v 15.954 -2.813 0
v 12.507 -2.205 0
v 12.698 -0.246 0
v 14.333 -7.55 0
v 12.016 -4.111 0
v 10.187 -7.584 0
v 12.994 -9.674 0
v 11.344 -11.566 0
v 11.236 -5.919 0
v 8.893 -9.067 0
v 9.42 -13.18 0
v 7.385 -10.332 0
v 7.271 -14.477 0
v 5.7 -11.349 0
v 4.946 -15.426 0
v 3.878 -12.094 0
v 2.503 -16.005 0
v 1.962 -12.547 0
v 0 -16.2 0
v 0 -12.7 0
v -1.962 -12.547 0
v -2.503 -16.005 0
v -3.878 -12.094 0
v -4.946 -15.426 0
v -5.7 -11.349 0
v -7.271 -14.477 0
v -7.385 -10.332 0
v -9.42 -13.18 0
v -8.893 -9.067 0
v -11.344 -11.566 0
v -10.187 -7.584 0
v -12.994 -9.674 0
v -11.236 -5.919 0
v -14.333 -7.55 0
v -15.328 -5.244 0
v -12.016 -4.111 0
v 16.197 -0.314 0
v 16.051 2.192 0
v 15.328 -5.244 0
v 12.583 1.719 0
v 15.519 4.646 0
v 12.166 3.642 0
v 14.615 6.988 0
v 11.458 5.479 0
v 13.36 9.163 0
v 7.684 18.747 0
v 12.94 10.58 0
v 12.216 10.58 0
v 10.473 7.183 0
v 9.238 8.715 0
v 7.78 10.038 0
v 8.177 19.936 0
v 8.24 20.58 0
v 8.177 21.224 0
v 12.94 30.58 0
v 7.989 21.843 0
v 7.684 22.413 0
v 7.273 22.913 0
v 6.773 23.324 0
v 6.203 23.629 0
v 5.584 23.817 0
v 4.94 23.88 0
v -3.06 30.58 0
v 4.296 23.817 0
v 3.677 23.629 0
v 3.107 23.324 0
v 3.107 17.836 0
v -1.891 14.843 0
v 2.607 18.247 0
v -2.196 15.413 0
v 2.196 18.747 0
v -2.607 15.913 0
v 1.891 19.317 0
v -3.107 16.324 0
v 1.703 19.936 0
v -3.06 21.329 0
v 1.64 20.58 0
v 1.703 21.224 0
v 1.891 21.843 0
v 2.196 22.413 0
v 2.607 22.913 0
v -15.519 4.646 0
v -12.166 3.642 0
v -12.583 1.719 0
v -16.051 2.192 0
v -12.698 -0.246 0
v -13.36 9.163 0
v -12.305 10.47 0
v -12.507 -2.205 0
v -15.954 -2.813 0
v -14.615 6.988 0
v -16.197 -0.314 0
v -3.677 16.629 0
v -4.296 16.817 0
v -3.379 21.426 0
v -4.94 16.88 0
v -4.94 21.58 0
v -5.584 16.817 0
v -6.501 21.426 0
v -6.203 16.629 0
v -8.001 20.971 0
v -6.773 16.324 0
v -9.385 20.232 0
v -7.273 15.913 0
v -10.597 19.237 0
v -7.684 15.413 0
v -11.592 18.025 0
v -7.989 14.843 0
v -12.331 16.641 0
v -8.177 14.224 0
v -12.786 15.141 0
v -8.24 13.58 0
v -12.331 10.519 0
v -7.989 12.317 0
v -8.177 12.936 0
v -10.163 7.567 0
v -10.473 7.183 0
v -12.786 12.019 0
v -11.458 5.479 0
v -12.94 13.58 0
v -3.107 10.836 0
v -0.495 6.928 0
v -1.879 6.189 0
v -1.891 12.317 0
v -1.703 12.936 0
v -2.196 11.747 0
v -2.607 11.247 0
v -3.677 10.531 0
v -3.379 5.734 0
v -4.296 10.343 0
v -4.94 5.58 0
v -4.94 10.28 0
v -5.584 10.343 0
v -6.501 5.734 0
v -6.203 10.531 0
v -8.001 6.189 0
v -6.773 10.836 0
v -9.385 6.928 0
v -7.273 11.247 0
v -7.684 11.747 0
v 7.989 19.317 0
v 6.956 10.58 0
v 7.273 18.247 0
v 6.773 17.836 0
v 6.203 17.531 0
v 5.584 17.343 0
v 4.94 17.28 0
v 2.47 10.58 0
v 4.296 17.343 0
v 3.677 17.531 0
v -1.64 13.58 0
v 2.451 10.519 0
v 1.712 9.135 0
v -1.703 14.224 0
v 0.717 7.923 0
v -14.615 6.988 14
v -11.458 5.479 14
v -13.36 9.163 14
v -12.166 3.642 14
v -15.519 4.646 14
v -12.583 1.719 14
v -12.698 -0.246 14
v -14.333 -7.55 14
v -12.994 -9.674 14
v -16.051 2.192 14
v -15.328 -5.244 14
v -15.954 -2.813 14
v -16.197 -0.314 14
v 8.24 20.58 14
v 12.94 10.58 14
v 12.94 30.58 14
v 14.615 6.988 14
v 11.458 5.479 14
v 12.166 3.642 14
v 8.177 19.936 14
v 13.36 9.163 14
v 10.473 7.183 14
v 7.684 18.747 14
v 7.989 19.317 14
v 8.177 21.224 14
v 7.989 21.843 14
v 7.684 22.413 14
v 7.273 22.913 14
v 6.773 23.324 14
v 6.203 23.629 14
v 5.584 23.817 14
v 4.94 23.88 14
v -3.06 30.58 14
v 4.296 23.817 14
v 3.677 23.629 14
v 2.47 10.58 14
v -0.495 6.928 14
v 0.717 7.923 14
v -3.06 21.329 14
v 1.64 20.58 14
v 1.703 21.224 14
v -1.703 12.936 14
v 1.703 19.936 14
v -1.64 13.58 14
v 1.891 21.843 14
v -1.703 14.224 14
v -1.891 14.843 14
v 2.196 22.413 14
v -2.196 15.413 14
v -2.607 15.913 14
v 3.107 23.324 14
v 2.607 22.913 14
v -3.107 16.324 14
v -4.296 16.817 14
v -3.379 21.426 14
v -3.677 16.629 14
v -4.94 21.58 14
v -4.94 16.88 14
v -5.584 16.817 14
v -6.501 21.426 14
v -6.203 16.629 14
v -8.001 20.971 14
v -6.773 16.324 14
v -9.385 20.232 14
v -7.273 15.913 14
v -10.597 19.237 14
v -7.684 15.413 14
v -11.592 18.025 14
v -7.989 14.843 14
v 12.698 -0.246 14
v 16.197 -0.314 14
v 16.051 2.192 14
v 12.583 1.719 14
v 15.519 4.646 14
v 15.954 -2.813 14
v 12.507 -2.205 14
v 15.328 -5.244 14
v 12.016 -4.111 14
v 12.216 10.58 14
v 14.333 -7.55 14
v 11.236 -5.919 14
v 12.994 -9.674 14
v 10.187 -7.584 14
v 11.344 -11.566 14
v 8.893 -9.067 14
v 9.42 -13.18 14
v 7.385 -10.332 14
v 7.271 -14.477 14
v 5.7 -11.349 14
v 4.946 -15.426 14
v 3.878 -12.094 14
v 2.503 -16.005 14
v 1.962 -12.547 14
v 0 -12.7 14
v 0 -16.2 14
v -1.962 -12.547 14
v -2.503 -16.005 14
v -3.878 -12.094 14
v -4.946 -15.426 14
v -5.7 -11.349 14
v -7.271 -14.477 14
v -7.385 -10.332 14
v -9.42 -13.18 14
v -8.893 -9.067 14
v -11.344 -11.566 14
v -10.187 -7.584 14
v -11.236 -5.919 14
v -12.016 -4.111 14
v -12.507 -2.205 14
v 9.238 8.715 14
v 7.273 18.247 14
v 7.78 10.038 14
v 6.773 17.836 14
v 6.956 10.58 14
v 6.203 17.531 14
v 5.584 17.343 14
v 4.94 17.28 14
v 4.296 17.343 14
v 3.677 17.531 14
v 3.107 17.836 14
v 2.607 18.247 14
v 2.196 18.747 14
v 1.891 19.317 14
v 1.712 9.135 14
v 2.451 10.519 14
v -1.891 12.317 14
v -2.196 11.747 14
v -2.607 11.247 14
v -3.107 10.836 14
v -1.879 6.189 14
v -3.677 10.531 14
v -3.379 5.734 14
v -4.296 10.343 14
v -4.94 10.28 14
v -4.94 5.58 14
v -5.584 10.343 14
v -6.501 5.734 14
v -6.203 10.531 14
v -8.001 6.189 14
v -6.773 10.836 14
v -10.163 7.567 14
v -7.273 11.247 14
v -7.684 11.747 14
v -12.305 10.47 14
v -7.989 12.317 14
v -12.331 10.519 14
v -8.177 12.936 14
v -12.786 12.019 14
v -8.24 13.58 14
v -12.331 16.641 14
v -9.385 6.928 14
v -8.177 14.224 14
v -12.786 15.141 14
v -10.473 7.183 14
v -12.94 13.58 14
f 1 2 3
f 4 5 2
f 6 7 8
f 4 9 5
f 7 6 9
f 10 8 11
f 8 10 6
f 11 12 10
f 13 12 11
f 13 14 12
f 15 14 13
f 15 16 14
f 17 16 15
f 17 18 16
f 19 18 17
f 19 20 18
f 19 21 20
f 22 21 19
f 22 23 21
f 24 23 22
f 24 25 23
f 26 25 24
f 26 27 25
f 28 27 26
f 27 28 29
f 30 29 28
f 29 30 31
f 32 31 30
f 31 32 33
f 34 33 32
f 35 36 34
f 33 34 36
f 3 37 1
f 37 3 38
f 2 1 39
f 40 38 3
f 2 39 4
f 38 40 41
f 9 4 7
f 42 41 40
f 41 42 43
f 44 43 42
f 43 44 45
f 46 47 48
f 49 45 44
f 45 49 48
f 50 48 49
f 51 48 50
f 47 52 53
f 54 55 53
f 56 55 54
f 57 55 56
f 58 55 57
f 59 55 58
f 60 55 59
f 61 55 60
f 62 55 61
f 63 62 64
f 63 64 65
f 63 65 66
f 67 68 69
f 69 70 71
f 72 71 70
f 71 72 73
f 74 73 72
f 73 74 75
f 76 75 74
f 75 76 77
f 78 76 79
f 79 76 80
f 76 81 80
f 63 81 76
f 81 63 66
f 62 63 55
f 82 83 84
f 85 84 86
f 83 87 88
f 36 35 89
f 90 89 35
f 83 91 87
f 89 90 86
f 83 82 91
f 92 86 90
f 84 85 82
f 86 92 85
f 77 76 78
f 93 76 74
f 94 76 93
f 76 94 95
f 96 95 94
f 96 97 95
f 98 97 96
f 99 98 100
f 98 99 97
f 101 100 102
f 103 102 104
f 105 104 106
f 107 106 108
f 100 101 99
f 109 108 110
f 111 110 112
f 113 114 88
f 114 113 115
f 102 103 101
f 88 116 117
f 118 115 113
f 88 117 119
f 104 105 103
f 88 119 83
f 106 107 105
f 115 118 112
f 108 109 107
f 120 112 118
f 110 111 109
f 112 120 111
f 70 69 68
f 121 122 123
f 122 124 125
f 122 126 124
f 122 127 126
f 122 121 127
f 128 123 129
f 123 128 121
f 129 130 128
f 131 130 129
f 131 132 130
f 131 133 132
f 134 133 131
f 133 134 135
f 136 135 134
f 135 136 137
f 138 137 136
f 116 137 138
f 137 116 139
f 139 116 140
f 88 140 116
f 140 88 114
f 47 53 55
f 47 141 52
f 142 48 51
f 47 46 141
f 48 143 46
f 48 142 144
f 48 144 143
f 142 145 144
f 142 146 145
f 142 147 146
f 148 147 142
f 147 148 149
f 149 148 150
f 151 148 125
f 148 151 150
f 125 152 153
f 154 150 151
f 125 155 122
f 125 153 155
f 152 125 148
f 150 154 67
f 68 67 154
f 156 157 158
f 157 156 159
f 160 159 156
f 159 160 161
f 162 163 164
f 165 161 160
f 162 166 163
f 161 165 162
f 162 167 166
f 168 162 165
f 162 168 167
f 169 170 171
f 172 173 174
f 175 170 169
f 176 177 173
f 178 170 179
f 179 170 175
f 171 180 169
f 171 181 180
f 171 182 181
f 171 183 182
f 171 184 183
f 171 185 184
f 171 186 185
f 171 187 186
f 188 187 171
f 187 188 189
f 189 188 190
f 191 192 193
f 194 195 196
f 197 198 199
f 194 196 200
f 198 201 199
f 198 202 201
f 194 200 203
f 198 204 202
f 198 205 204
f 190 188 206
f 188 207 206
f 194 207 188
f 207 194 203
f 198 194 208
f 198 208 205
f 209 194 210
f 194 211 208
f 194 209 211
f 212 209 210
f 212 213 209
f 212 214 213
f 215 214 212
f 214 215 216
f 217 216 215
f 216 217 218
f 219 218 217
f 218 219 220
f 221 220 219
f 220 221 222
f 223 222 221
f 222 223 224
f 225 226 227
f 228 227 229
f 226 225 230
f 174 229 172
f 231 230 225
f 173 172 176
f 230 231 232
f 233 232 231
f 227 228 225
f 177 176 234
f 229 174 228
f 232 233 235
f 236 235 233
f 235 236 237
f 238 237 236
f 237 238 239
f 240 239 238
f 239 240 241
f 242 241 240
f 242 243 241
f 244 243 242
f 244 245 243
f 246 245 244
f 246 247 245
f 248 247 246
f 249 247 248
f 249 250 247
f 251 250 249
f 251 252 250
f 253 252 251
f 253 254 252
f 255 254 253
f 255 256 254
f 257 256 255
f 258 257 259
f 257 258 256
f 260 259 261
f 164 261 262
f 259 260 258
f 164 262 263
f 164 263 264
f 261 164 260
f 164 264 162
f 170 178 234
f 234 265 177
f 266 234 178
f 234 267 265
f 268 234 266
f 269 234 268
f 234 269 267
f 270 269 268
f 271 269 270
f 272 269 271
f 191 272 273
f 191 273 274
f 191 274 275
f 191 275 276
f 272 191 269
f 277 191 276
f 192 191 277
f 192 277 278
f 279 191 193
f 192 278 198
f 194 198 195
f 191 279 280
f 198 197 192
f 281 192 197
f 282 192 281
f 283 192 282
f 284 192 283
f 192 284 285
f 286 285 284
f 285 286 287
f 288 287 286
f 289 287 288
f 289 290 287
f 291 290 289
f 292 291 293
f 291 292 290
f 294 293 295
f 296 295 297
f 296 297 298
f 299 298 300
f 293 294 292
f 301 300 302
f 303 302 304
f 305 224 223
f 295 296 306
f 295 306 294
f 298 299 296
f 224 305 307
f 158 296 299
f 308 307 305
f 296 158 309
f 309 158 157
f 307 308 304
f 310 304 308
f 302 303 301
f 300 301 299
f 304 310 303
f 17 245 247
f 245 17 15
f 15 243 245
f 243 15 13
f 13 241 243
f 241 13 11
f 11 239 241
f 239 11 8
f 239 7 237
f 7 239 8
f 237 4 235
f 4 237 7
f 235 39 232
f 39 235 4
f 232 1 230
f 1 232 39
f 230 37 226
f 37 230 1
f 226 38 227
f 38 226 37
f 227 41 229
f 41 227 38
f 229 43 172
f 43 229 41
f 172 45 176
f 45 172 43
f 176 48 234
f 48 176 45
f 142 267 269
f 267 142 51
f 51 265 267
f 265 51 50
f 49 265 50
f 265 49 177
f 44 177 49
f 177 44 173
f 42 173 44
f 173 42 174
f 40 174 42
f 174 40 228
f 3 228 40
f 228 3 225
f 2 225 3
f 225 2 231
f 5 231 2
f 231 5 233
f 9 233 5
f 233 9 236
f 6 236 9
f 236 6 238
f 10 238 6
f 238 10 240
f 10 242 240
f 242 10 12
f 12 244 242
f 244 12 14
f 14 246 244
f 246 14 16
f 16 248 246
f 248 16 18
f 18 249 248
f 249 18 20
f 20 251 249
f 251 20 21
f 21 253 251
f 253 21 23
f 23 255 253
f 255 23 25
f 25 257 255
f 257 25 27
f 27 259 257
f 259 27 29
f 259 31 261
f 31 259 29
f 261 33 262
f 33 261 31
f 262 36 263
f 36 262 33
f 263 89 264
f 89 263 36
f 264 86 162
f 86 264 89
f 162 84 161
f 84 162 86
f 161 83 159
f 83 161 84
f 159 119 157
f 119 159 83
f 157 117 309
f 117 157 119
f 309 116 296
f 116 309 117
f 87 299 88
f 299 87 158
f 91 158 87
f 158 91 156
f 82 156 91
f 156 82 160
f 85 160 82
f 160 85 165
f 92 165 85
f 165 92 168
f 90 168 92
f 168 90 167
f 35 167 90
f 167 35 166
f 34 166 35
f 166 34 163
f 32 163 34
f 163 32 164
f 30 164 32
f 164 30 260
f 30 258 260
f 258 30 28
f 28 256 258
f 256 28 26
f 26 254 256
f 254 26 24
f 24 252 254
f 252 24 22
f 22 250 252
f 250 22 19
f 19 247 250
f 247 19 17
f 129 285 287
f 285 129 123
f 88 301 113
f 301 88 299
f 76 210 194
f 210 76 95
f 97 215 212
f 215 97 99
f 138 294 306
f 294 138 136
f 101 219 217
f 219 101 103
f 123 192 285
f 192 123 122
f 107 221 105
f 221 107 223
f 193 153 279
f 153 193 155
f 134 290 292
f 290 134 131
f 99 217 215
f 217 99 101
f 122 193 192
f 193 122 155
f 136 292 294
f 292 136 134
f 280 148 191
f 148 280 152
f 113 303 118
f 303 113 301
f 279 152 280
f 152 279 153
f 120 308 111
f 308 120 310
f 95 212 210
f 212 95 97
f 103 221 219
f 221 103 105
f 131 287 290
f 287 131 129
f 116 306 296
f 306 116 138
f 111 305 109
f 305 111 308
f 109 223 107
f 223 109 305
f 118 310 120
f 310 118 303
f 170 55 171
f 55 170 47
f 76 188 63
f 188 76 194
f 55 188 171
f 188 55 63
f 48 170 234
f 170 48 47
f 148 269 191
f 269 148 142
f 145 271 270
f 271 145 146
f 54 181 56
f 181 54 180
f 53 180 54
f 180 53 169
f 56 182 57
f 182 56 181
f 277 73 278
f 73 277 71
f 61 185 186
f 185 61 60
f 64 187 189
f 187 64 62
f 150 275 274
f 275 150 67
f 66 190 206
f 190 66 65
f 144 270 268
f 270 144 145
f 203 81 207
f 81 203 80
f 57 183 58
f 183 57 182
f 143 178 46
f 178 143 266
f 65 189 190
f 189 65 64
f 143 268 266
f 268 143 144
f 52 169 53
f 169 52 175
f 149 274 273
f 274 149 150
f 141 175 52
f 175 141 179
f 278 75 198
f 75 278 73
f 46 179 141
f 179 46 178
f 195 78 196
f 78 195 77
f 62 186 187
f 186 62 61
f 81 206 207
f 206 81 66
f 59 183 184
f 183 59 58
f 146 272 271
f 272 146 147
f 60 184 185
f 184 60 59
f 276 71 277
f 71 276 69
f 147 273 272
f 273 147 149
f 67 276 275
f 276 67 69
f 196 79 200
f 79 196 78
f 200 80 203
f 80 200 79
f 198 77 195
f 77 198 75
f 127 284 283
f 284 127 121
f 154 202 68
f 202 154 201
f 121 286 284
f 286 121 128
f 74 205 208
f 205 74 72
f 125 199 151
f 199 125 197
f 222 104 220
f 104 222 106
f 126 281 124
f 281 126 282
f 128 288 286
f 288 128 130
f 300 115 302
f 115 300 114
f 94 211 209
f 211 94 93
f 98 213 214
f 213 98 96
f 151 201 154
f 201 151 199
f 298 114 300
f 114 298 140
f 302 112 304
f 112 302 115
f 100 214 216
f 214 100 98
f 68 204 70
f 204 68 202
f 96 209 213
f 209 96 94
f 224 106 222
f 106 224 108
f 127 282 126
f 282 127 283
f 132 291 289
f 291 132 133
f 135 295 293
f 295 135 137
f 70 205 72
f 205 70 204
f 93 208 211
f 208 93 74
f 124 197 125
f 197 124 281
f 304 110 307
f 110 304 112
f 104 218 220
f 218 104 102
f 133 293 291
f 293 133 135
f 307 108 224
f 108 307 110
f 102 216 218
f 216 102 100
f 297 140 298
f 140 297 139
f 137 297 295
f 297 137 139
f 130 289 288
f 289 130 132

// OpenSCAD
$fn = 32;

// ----------------------------------------------------------------------
// Pipe clamp: 32.4 mm ring, 3.5 mm wall, 14 mm wide
// ----------------------------------------------------------------------

// --- parameters (mm) ---
outer_r = 16.2;           // clamp outside radius
inner_r = 12.7;           // pipe bore radius
band = 3.5;               // band thickness
clamp_w = 14;             // clamp width
opening = 40;             // opening angle between the ends
lug_w = 16;               // lug width
lug_len = 20;             // lug length
bolt_d = 6.6;             // bolt hole
knuckle_d = 16;           // hinge knuckle diameter
pin_d = 6.6;              // hinge pin hole

clamp_profile = [[-5.541, 15.223], [-7.826, 14.184], [-9.924, 12.804], [-11.783, 11.117], [-13.36, 9.163], [-14.615, 6.988], [-15.519, 4.646], [-16.051, 2.192], [-16.197, -0.314], [-15.954, -2.813], [-15.328, -5.244], [-14.333, -7.55], [-12.994, -9.674], [-11.344, -11.566], [-9.42, -13.18], [-7.271, -14.477], [-4.946, -15.426], [-2.503, -16.005], [0, -16.2], [2.503, -16.005], [4.946, -15.426], [7.271, -14.477], [9.42, -13.18], [11.344, -11.566], [12.994, -9.674], [14.333, -7.55], [15.328, -5.244], [15.954, -2.813], [16.197, -0.314], [16.051, 2.192], [15.519, 4.646], [14.615, 6.988], [13.36, 9.163], [11.783, 11.117], [9.924, 12.804], [7.826, 14.184], [5.541, 15.223], [4.344, 11.934], [6.136, 11.12], [7.78, 10.038], [9.238, 8.715], [10.473, 7.183], [11.458, 5.479], [12.166, 3.642], [12.583, 1.719], [12.698, -0.246], [12.507, -2.205], [12.016, -4.111], [11.236, -5.919], [10.187, -7.584], [8.893, -9.067], [7.385, -10.332], [5.7, -11.349], [3.878, -12.094], [1.962, -12.547], [0, -12.7], [-1.962, -12.547], [-3.878, -12.094], [-5.7, -11.349], [-7.385, -10.332], [-8.893, -9.067], [-10.187, -7.584], [-11.236, -5.919], [-12.016, -4.111], [-12.507, -2.205], [-12.698, -0.246], [-12.583, 1.719], [-12.166, 3.642], [-11.458, 5.479], [-10.473, 7.183], [-9.238, 8.715], [-7.78, 10.038], [-6.136, 11.12], [-4.344, 11.934]];

difference() {
  union() {
    linear_extrude(height = clamp_w) polygon(clamp_profile);
    /* hinge knuckle, sunk 2 mm into the band end */
    translate([-4.94, 13.58, 0]) cylinder(h = clamp_w, d = knuckle_d);
    /* bolt lug on the other end */
    translate([-3.06, 10.58, 0]) cube([lug_w, 20, clamp_w]);
  }
  translate([4.94, 20.58, -2.5]) cylinder(h = clamp_w + 5, d = bolt_d);
  translate([-4.94, 13.58, -2.5]) cylinder(h = clamp_w + 5, d = pin_d);
}
